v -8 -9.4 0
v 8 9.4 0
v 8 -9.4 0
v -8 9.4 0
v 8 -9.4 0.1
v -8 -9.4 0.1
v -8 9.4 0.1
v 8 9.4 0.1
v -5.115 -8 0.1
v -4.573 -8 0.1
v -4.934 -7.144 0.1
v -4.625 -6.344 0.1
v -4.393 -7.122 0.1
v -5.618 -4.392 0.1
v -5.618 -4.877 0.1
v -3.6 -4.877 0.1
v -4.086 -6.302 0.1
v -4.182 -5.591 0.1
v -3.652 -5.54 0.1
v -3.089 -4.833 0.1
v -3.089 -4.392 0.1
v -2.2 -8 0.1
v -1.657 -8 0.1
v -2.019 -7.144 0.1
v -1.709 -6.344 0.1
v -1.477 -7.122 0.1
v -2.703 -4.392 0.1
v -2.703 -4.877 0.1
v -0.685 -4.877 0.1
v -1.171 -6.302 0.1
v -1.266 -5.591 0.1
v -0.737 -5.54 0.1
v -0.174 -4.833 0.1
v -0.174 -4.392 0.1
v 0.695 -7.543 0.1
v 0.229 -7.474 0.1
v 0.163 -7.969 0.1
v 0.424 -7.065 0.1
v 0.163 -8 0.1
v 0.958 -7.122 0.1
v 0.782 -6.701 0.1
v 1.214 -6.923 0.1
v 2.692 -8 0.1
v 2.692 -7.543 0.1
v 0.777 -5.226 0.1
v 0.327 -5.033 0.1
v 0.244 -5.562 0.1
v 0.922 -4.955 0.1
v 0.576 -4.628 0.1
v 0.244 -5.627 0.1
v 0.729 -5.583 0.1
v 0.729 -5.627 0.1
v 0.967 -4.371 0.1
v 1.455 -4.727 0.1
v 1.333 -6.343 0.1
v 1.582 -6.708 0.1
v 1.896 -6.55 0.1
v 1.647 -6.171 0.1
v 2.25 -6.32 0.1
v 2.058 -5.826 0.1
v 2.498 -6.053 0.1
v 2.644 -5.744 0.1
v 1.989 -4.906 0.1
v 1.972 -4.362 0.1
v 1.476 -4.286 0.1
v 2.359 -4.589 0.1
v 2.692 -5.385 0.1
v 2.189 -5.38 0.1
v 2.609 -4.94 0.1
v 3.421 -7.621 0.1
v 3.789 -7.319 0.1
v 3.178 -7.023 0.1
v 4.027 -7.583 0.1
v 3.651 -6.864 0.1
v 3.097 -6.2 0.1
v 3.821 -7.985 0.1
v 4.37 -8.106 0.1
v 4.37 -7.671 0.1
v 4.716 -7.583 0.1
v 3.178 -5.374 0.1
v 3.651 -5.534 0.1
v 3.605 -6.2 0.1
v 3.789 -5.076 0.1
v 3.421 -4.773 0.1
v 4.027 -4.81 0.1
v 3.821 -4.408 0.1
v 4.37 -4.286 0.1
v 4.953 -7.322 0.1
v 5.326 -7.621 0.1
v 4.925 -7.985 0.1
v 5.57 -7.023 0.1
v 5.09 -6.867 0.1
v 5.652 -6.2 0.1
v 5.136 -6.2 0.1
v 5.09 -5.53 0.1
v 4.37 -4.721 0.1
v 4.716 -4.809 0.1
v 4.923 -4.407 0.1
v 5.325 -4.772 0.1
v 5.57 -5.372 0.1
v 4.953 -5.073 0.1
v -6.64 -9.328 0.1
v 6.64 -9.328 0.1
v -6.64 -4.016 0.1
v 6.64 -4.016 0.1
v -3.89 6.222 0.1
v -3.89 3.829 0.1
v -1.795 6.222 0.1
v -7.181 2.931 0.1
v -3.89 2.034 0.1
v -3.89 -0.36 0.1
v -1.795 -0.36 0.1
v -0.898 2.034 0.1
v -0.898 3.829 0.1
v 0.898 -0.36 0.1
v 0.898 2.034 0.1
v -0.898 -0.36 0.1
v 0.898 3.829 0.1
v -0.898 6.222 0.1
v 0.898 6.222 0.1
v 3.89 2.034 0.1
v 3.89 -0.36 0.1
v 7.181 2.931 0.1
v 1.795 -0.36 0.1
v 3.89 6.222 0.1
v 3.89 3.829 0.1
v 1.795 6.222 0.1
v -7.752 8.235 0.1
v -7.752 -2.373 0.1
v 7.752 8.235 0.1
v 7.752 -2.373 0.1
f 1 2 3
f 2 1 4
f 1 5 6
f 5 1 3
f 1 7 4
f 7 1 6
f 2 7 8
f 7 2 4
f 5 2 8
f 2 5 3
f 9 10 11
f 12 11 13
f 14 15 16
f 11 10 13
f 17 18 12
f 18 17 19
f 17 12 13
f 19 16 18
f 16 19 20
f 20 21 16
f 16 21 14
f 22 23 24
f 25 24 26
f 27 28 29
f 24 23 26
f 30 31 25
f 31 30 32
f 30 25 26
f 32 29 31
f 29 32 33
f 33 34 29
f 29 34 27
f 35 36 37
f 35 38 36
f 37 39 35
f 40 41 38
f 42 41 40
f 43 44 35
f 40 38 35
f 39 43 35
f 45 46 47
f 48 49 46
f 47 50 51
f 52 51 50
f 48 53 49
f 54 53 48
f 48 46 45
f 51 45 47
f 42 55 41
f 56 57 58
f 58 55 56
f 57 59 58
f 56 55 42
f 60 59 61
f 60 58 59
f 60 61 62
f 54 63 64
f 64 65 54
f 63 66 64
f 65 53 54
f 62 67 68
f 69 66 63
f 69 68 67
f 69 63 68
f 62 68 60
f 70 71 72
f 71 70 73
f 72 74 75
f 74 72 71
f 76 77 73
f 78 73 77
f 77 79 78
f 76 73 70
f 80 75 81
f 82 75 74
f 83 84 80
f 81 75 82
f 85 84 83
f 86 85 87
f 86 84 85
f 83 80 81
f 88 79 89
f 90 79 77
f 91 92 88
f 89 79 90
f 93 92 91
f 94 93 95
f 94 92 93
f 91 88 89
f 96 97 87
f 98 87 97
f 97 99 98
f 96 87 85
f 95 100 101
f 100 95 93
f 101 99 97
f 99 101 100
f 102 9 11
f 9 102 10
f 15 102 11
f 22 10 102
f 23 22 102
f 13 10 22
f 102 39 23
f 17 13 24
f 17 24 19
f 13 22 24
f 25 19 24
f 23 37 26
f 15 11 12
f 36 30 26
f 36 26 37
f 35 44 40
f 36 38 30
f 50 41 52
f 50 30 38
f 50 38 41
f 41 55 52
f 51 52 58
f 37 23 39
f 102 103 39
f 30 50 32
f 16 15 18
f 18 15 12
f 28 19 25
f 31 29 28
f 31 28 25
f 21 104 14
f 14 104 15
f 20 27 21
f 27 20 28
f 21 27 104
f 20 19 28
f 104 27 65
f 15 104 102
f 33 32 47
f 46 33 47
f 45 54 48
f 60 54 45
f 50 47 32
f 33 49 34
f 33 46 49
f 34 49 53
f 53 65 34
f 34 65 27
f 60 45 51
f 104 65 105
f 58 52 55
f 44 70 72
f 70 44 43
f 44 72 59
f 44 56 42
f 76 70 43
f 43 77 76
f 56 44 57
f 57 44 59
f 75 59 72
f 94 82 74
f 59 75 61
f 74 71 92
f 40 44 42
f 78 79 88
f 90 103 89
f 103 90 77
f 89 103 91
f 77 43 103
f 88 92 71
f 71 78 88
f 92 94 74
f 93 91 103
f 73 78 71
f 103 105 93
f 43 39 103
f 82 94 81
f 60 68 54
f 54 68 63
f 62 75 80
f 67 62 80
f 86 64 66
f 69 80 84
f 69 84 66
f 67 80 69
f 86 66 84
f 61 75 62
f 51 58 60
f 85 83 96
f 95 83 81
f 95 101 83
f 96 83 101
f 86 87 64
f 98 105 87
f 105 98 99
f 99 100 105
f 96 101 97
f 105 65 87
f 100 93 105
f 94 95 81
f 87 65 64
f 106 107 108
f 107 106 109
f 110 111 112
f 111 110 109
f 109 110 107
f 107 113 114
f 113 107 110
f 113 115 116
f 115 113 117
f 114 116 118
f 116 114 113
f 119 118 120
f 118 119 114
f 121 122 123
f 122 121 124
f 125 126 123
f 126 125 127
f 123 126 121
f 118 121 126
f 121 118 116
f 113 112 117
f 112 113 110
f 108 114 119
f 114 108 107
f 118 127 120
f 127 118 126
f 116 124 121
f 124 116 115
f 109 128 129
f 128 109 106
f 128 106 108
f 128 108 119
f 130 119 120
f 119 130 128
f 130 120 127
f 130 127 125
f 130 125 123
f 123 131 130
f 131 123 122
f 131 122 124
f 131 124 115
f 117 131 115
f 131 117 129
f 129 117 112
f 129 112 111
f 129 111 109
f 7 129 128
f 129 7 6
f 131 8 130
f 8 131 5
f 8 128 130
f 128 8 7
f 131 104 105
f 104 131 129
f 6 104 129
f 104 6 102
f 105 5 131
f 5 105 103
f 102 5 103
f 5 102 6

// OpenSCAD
// file: s/191915schb.scad
use <../../lib.scad>
function ldraw_lib__s__191915schb() = [
// 0 ~Swiss Railways Logo Background
// 0 Name: s\191915schb.dat
// 0 Author: Chris Dee [cwdee]
// 0 !LDRAW_ORG Subpart UPDATE 2012-01
// 0 !LICENSE Licensed under CC BY 2.0 and CC BY 4.0 : see CAreadme.txt
// 
// 0 BFC CERTIFY CCW
  [0,"BFC","CERTIFY"],
  [0,"BFC","CCW"],
// 
// 0 !HISTORY 2012-03-30 [PTadmin] Official Update 2012-01
// 
// 
// 4 16 -13.2 0 -24.2 -6.6 0 -24.2 -6.6 0 -6.6 -28.6 0 -6.6
  [4,16,-13.2,0,-24.2,-6.6,0,-24.2,-6.6,0,-6.6,-28.6,0,-6.6],
// 4 16 -6.6 0 6.6 -6.6 0 24.2 -13.2 0 24.2 -28.6 0 6.6
  [4,16,-6.6,0,6.6,-6.6,0,24.2,-13.2,0,24.2,-28.6,0,6.6],
// 4 16 13.2 0 24.2 6.6 0 24.2 6.6 0 6.6 28.6 0 6.6
  [4,16,13.2,0,24.2,6.6,0,24.2,6.6,0,6.6,28.6,0,6.6],
// 4 16 6.6 0 -6.6 6.6 0 -24.2 13.2 0 -24.2 28.6 0 -6.6
  [4,16,6.6,0,-6.6,6.6,0,-24.2,13.2,0,-24.2,28.6,0,-6.6],
// 
// 3 16 -52.8 0 0 -57 0 39 -57 0 -39
  [3,16,-52.8,0,0,-57,0,39,-57,0,-39],
// 3 16 -57 0 39 -52.8 0 0 -28.6 0 24.2
  [3,16,-57,0,39,-52.8,0,0,-28.6,0,24.2],
// 3 16 -57 0 39 -28.6 0 24.2 -13.2 0 24.2
  [3,16,-57,0,39,-28.6,0,24.2,-13.2,0,24.2],
// 3 16 -57 0 39 -13.2 0 24.2 -6.6 0 24.2
  [3,16,-57,0,39,-13.2,0,24.2,-6.6,0,24.2],
// 4 16 -57 0 39 -6.6 0 24.2 6.6 0 24.2 57 0 39
  [4,16,-57,0,39,-6.6,0,24.2,6.6,0,24.2,57,0,39],
// 3 16 57 0 39 6.6 0 24.2 13.2 0 24.2
  [3,16,57,0,39,6.6,0,24.2,13.2,0,24.2],
// 3 16 57 0 39 13.2 0 24.2 28.6 0 24.2
  [3,16,57,0,39,13.2,0,24.2,28.6,0,24.2],
// 3 16 57 0 39 28.6 0 24.2 52.8 0 0
  [3,16,57,0,39,28.6,0,24.2,52.8,0,0],
// 
// 3 16 52.8 0 0 57 0 -39 57 0 39
  [3,16,52.8,0,0,57,0,-39,57,0,39],
// 3 16 57 0 -39 52.8 0 0 28.6 0 -24.2
  [3,16,57,0,-39,52.8,0,0,28.6,0,-24.2],
// 3 16 57 0 -39 28.6 0 -24.2 13.2 0 -24.2
  [3,16,57,0,-39,28.6,0,-24.2,13.2,0,-24.2],
// 3 16 57 0 -39 13.2 0 -24.2 6.6 0 -24.2
  [3,16,57,0,-39,13.2,0,-24.2,6.6,0,-24.2],
// 4 16 57 0 -39 6.6 0 -24.2 -6.6 0 -24.2 -57 0 -39
  [4,16,57,0,-39,6.6,0,-24.2,-6.6,0,-24.2,-57,0,-39],
// 3 16 -57 0 -39 -6.6 0 -24.2 -13.2 0 -24.2
  [3,16,-57,0,-39,-6.6,0,-24.2,-13.2,0,-24.2],
// 3 16 -57 0 -39 -13.2 0 -24.2 -28.6 0 -24.2
  [3,16,-57,0,-39,-13.2,0,-24.2,-28.6,0,-24.2],
// 3 16 -57 0 -39 -28.6 0 -24.2 -52.8 0 0
  [3,16,-57,0,-39,-28.6,0,-24.2,-52.8,0,0],
// 0
];
makepoly(ldraw_lib__s__191915schb(), line=0.2);
// file: s/191915scha.scad
use <../../lib.scad>
function ldraw_lib__s__191915scha() = [
// 0 ~Swiss Railways Logo Foreground
// 0 Name: s\191915scha.dat
// 0 Author: Chris Dee [cwdee]
// 0 !LDRAW_ORG Subpart UPDATE 2012-01
// 0 !LICENSE Licensed under CC BY 2.0 and CC BY 4.0 : see CAreadme.txt
// 
// 0 BFC CERTIFY CCW
  [0,"BFC","CERTIFY"],
  [0,"BFC","CCW"],
// 
// 0 !HISTORY 2012-03-30 [PTadmin] Official Update 2012-01
// 
// 
// 4 16 -13.2 0 24.2 -28.6 0 24.2 -52.8 0 0 -28.6 0 6.6
  [4,16,-13.2,0,24.2,-28.6,0,24.2,-52.8,0,0,-28.6,0,6.6],
// 4 16 -52.8 0 0 -28.6 0 -24.2 -13.2 0 -24.2 -28.6 0 -6.6
  [4,16,-52.8,0,0,-28.6,0,-24.2,-13.2,0,-24.2,-28.6,0,-6.6],
// 3 16 -52.8 0 0 -28.6 0 -6.6 -28.6 0 6.6
  [3,16,-52.8,0,0,-28.6,0,-6.6,-28.6,0,6.6],
// 4 16 -28.6 0 6.6 -28.6 0 -6.6 -6.6 0 -6.6 -6.6 0 6.6
  [4,16,-28.6,0,6.6,-28.6,0,-6.6,-6.6,0,-6.6,-6.6,0,6.6],
// 
// 4 16 6.6 0 -6.6 -6.6 0 -6.6 -6.6 0 -24.2 6.6 0 -24.2
  [4,16,6.6,0,-6.6,-6.6,0,-6.6,-6.6,0,-24.2,6.6,0,-24.2],
// 4 16 6.6 0 6.6 -6.6 0 6.6 -6.6 0 -6.6 6.6 0 -6.6
  [4,16,6.6,0,6.6,-6.6,0,6.6,-6.6,0,-6.6,6.6,0,-6.6],
// 4 16 6.6 0 24.2 -6.6 0 24.2 -6.6 0 6.6 6.6 0 6.6
  [4,16,6.6,0,24.2,-6.6,0,24.2,-6.6,0,6.6,6.6,0,6.6],
// 
// 4 16 13.2 0 -24.2 28.6 0 -24.2 52.8 0 0 28.6 0 -6.6
  [4,16,13.2,0,-24.2,28.6,0,-24.2,52.8,0,0,28.6,0,-6.6],
// 4 16 52.8 0 0 28.6 0 24.2 13.2 0 24.2 28.6 0 6.6
  [4,16,52.8,0,0,28.6,0,24.2,13.2,0,24.2,28.6,0,6.6],
// 3 16 52.8 0 0 28.6 0 6.6 28.6 0 -6.6
  [3,16,52.8,0,0,28.6,0,6.6,28.6,0,-6.6],
// 4 16 28.6 0 -6.6 28.6 0 6.6 6.6 0 6.6 6.6 0 -6.6
  [4,16,28.6,0,-6.6,28.6,0,6.6,6.6,0,6.6,6.6,0,-6.6],
// 0
];
makepoly(ldraw_lib__s__191915scha(), line=0.2);
// file: s/191915sch.scad
use <../../lib.scad>
use <191915scha.scad>
use <191915schb.scad>
function ldraw_lib__s__191915sch() = [
// 0 ~Swiss Railways Logo White
// 0 Name: s\191915sch.dat
// 0 Author: Chris Dee [cwdee]
// 0 !LDRAW_ORG Subpart UPDATE 2012-01
// 0 !LICENSE Licensed under CC BY 2.0 and CC BY 4.0 : see CAreadme.txt
// 
// 0 BFC CERTIFY CCW
  [0,"BFC","CERTIFY"],
  [0,"BFC","CCW"],
// 
// 0 !HISTORY 2012-03-30 [PTadmin] Official Update 2012-01
// 
// 
// 1 15 0 0 0 1 0 0 0 1 0 0 0 1 s\191915scha.dat
  [1,15,0,0,0,1,0,0,0,1,0,0,0,1, ldraw_lib__s__191915scha()],
// 1 16 0 0 0 1 0 0 0 1 0 0 0 1 s\191915schb.dat
  [1,16,0,0,0,1,0,0,0,1,0,0,0,1, ldraw_lib__s__191915schb()],
// 0
];
makepoly(ldraw_lib__s__191915sch(), line=0.2);
// file: ../p/box5-12.scad
use <../lib.scad>
function ldraw_lib__box5_12() = [
// 0 Box with 5 Faces without Any Edges
// 0 Name: box5-12.dat
// 0 Author: Chris Dee [cwdee]
// 0 !LDRAW_ORG Primitive UPDATE 2009-02
// 0 !LICENSE Licensed under CC BY 2.0 and CC BY 4.0 : see CAreadme.txt
// 
// 0 BFC CERTIFY CCW
  [0,"BFC","CERTIFY"],
  [0,"BFC","CCW"],
// 
// 0 !HISTORY 2009-09-03 [PTadmin] Official Update 2009-02
// 
// 
// 4 16 1 1 1 1 1 -1 -1 1 -1 -1 1 1
  [4,16,1,1,1,1,1,-1,-1,1,-1,-1,1,1],
// 4 16 -1 0 1 1 0 1 1 1 1 -1 1 1
  [4,16,-1,0,1,1,0,1,1,1,1,-1,1,1],
// 4 16 -1 0 -1 -1 0 1 -1 1 1 -1 1 -1
  [4,16,-1,0,-1,-1,0,1,-1,1,1,-1,1,-1],
// 4 16 1 0 -1 -1 0 -1 -1 1 -1 1 1 -1
  [4,16,1,0,-1,-1,0,-1,-1,1,-1,1,1,-1],
// 4 16 1 0 1 1 0 -1 1 1 -1 1 1 1
  [4,16,1,0,1,1,0,-1,1,1,-1,1,1,1],
// 0
];
makepoly(ldraw_lib__box5_12(), line=0.2);
// main file
use <../lib.scad>
use <../p/box5-12.scad>
use <s/191895s01.scad>
use <s/191915sch.scad>
function ldraw_lib__191895d() = [
// 0 Sticker  2.4 x  2 with White Swiss Railways Logo and "7720"
// 0 Name: 191895d.dat
// 0 Author: Chris Dee [cwdee]
// 0 !LDRAW_ORG Part UPDATE 2012-01
// 0 !LICENSE Licensed under CC BY 2.0 and CC BY 4.0 : see CAreadme.txt
// 
// 0 BFC CERTIFY CCW
  [0,"BFC","CERTIFY"],
  [0,"BFC","CCW"],
// 
// 0 !HISTORY 2012-03-30 [PTadmin] Official Update 2012-01
// 
// 
// 1 16 0 -0.25 0 20 0 0 0 0.25 0 0 0 -23.5 box5-12.dat
  [1,16,0,-0.25,0,20,0,0,0,0.25,0,0,0,-23.5, ldraw_lib__box5_12()],
// 1 16 0 -0.25 -20 0.415 0 0 0 1 0 0 0 0.415 s\191895s01.dat
  [1,16,0,-0.25,-20,0.415,0,0,0,1,0,0,0,0.415, ldraw_lib__s__191895s01()],
// 1 16 0 -0.25 7.328 0.34 0 0 0 1 0 0 0 0.34 s\191915sch.dat
  [1,16,0,-0.25,7.328,0.34,0,0,0,1,0,0,0,0.34, ldraw_lib__s__191915sch()],
// 4 16 -20 -0.25 -23.5 -19.38 -0.25 -5.932 -19.38 -0.25 20.588 -20 -0.25 23.5
  [4,16,-20,-0.25,-23.5,-19.38,-0.25,-5.932,-19.38,-0.25,20.588,-20,-0.25,23.5],
// 4 16 20 -0.25 23.5 19.38 -0.25 20.588 19.38 -0.25 -5.932 20 -0.25 -23.5
  [4,16,20,-0.25,23.5,19.38,-0.25,20.588,19.38,-0.25,-5.932,20,-0.25,-23.5],
// 4 16 -20 -0.25 23.5 -19.38 -0.25 20.588 19.38 -0.25 20.588 20 -0.25 23.5
  [4,16,-20,-0.25,23.5,-19.38,-0.25,20.588,19.38,-0.25,20.588,20,-0.25,23.5],
// 4 16 -19.38 -0.25 -5.932 -16.6 -0.25 -10.04 16.6 -0.25 -10.04 19.38 -0.25 -5.932
  [4,16,-19.38,-0.25,-5.932,-16.6,-0.25,-10.04,16.6,-0.25,-10.04,19.38,-0.25,-5.932],
// 4 16 -16.6 -0.25 -10.04 -19.38 -0.25 -5.932 -20 -0.25 -23.5 -16.6 -0.25 -23.32
  [4,16,-16.6,-0.25,-10.04,-19.38,-0.25,-5.932,-20,-0.25,-23.5,-16.6,-0.25,-23.32],
// 4 16 16.6 -0.25 -23.32 20 -0.25 -23.5 19.38 -0.25 -5.932 16.6 -0.25 -10.04
  [4,16,16.6,-0.25,-23.32,20,-0.25,-23.5,19.38,-0.25,-5.932,16.6,-0.25,-10.04],
// 4 16 -16.6 -0.25 -23.32 -20 -0.25 -23.5 20 -0.25 -23.5 16.6 -0.25 -23.32
  [4,16,-16.6,-0.25,-23.32,-20,-0.25,-23.5,20,-0.25,-23.5,16.6,-0.25,-23.32],
];
makepoly(ldraw_lib__191895d(), line=0.2);
